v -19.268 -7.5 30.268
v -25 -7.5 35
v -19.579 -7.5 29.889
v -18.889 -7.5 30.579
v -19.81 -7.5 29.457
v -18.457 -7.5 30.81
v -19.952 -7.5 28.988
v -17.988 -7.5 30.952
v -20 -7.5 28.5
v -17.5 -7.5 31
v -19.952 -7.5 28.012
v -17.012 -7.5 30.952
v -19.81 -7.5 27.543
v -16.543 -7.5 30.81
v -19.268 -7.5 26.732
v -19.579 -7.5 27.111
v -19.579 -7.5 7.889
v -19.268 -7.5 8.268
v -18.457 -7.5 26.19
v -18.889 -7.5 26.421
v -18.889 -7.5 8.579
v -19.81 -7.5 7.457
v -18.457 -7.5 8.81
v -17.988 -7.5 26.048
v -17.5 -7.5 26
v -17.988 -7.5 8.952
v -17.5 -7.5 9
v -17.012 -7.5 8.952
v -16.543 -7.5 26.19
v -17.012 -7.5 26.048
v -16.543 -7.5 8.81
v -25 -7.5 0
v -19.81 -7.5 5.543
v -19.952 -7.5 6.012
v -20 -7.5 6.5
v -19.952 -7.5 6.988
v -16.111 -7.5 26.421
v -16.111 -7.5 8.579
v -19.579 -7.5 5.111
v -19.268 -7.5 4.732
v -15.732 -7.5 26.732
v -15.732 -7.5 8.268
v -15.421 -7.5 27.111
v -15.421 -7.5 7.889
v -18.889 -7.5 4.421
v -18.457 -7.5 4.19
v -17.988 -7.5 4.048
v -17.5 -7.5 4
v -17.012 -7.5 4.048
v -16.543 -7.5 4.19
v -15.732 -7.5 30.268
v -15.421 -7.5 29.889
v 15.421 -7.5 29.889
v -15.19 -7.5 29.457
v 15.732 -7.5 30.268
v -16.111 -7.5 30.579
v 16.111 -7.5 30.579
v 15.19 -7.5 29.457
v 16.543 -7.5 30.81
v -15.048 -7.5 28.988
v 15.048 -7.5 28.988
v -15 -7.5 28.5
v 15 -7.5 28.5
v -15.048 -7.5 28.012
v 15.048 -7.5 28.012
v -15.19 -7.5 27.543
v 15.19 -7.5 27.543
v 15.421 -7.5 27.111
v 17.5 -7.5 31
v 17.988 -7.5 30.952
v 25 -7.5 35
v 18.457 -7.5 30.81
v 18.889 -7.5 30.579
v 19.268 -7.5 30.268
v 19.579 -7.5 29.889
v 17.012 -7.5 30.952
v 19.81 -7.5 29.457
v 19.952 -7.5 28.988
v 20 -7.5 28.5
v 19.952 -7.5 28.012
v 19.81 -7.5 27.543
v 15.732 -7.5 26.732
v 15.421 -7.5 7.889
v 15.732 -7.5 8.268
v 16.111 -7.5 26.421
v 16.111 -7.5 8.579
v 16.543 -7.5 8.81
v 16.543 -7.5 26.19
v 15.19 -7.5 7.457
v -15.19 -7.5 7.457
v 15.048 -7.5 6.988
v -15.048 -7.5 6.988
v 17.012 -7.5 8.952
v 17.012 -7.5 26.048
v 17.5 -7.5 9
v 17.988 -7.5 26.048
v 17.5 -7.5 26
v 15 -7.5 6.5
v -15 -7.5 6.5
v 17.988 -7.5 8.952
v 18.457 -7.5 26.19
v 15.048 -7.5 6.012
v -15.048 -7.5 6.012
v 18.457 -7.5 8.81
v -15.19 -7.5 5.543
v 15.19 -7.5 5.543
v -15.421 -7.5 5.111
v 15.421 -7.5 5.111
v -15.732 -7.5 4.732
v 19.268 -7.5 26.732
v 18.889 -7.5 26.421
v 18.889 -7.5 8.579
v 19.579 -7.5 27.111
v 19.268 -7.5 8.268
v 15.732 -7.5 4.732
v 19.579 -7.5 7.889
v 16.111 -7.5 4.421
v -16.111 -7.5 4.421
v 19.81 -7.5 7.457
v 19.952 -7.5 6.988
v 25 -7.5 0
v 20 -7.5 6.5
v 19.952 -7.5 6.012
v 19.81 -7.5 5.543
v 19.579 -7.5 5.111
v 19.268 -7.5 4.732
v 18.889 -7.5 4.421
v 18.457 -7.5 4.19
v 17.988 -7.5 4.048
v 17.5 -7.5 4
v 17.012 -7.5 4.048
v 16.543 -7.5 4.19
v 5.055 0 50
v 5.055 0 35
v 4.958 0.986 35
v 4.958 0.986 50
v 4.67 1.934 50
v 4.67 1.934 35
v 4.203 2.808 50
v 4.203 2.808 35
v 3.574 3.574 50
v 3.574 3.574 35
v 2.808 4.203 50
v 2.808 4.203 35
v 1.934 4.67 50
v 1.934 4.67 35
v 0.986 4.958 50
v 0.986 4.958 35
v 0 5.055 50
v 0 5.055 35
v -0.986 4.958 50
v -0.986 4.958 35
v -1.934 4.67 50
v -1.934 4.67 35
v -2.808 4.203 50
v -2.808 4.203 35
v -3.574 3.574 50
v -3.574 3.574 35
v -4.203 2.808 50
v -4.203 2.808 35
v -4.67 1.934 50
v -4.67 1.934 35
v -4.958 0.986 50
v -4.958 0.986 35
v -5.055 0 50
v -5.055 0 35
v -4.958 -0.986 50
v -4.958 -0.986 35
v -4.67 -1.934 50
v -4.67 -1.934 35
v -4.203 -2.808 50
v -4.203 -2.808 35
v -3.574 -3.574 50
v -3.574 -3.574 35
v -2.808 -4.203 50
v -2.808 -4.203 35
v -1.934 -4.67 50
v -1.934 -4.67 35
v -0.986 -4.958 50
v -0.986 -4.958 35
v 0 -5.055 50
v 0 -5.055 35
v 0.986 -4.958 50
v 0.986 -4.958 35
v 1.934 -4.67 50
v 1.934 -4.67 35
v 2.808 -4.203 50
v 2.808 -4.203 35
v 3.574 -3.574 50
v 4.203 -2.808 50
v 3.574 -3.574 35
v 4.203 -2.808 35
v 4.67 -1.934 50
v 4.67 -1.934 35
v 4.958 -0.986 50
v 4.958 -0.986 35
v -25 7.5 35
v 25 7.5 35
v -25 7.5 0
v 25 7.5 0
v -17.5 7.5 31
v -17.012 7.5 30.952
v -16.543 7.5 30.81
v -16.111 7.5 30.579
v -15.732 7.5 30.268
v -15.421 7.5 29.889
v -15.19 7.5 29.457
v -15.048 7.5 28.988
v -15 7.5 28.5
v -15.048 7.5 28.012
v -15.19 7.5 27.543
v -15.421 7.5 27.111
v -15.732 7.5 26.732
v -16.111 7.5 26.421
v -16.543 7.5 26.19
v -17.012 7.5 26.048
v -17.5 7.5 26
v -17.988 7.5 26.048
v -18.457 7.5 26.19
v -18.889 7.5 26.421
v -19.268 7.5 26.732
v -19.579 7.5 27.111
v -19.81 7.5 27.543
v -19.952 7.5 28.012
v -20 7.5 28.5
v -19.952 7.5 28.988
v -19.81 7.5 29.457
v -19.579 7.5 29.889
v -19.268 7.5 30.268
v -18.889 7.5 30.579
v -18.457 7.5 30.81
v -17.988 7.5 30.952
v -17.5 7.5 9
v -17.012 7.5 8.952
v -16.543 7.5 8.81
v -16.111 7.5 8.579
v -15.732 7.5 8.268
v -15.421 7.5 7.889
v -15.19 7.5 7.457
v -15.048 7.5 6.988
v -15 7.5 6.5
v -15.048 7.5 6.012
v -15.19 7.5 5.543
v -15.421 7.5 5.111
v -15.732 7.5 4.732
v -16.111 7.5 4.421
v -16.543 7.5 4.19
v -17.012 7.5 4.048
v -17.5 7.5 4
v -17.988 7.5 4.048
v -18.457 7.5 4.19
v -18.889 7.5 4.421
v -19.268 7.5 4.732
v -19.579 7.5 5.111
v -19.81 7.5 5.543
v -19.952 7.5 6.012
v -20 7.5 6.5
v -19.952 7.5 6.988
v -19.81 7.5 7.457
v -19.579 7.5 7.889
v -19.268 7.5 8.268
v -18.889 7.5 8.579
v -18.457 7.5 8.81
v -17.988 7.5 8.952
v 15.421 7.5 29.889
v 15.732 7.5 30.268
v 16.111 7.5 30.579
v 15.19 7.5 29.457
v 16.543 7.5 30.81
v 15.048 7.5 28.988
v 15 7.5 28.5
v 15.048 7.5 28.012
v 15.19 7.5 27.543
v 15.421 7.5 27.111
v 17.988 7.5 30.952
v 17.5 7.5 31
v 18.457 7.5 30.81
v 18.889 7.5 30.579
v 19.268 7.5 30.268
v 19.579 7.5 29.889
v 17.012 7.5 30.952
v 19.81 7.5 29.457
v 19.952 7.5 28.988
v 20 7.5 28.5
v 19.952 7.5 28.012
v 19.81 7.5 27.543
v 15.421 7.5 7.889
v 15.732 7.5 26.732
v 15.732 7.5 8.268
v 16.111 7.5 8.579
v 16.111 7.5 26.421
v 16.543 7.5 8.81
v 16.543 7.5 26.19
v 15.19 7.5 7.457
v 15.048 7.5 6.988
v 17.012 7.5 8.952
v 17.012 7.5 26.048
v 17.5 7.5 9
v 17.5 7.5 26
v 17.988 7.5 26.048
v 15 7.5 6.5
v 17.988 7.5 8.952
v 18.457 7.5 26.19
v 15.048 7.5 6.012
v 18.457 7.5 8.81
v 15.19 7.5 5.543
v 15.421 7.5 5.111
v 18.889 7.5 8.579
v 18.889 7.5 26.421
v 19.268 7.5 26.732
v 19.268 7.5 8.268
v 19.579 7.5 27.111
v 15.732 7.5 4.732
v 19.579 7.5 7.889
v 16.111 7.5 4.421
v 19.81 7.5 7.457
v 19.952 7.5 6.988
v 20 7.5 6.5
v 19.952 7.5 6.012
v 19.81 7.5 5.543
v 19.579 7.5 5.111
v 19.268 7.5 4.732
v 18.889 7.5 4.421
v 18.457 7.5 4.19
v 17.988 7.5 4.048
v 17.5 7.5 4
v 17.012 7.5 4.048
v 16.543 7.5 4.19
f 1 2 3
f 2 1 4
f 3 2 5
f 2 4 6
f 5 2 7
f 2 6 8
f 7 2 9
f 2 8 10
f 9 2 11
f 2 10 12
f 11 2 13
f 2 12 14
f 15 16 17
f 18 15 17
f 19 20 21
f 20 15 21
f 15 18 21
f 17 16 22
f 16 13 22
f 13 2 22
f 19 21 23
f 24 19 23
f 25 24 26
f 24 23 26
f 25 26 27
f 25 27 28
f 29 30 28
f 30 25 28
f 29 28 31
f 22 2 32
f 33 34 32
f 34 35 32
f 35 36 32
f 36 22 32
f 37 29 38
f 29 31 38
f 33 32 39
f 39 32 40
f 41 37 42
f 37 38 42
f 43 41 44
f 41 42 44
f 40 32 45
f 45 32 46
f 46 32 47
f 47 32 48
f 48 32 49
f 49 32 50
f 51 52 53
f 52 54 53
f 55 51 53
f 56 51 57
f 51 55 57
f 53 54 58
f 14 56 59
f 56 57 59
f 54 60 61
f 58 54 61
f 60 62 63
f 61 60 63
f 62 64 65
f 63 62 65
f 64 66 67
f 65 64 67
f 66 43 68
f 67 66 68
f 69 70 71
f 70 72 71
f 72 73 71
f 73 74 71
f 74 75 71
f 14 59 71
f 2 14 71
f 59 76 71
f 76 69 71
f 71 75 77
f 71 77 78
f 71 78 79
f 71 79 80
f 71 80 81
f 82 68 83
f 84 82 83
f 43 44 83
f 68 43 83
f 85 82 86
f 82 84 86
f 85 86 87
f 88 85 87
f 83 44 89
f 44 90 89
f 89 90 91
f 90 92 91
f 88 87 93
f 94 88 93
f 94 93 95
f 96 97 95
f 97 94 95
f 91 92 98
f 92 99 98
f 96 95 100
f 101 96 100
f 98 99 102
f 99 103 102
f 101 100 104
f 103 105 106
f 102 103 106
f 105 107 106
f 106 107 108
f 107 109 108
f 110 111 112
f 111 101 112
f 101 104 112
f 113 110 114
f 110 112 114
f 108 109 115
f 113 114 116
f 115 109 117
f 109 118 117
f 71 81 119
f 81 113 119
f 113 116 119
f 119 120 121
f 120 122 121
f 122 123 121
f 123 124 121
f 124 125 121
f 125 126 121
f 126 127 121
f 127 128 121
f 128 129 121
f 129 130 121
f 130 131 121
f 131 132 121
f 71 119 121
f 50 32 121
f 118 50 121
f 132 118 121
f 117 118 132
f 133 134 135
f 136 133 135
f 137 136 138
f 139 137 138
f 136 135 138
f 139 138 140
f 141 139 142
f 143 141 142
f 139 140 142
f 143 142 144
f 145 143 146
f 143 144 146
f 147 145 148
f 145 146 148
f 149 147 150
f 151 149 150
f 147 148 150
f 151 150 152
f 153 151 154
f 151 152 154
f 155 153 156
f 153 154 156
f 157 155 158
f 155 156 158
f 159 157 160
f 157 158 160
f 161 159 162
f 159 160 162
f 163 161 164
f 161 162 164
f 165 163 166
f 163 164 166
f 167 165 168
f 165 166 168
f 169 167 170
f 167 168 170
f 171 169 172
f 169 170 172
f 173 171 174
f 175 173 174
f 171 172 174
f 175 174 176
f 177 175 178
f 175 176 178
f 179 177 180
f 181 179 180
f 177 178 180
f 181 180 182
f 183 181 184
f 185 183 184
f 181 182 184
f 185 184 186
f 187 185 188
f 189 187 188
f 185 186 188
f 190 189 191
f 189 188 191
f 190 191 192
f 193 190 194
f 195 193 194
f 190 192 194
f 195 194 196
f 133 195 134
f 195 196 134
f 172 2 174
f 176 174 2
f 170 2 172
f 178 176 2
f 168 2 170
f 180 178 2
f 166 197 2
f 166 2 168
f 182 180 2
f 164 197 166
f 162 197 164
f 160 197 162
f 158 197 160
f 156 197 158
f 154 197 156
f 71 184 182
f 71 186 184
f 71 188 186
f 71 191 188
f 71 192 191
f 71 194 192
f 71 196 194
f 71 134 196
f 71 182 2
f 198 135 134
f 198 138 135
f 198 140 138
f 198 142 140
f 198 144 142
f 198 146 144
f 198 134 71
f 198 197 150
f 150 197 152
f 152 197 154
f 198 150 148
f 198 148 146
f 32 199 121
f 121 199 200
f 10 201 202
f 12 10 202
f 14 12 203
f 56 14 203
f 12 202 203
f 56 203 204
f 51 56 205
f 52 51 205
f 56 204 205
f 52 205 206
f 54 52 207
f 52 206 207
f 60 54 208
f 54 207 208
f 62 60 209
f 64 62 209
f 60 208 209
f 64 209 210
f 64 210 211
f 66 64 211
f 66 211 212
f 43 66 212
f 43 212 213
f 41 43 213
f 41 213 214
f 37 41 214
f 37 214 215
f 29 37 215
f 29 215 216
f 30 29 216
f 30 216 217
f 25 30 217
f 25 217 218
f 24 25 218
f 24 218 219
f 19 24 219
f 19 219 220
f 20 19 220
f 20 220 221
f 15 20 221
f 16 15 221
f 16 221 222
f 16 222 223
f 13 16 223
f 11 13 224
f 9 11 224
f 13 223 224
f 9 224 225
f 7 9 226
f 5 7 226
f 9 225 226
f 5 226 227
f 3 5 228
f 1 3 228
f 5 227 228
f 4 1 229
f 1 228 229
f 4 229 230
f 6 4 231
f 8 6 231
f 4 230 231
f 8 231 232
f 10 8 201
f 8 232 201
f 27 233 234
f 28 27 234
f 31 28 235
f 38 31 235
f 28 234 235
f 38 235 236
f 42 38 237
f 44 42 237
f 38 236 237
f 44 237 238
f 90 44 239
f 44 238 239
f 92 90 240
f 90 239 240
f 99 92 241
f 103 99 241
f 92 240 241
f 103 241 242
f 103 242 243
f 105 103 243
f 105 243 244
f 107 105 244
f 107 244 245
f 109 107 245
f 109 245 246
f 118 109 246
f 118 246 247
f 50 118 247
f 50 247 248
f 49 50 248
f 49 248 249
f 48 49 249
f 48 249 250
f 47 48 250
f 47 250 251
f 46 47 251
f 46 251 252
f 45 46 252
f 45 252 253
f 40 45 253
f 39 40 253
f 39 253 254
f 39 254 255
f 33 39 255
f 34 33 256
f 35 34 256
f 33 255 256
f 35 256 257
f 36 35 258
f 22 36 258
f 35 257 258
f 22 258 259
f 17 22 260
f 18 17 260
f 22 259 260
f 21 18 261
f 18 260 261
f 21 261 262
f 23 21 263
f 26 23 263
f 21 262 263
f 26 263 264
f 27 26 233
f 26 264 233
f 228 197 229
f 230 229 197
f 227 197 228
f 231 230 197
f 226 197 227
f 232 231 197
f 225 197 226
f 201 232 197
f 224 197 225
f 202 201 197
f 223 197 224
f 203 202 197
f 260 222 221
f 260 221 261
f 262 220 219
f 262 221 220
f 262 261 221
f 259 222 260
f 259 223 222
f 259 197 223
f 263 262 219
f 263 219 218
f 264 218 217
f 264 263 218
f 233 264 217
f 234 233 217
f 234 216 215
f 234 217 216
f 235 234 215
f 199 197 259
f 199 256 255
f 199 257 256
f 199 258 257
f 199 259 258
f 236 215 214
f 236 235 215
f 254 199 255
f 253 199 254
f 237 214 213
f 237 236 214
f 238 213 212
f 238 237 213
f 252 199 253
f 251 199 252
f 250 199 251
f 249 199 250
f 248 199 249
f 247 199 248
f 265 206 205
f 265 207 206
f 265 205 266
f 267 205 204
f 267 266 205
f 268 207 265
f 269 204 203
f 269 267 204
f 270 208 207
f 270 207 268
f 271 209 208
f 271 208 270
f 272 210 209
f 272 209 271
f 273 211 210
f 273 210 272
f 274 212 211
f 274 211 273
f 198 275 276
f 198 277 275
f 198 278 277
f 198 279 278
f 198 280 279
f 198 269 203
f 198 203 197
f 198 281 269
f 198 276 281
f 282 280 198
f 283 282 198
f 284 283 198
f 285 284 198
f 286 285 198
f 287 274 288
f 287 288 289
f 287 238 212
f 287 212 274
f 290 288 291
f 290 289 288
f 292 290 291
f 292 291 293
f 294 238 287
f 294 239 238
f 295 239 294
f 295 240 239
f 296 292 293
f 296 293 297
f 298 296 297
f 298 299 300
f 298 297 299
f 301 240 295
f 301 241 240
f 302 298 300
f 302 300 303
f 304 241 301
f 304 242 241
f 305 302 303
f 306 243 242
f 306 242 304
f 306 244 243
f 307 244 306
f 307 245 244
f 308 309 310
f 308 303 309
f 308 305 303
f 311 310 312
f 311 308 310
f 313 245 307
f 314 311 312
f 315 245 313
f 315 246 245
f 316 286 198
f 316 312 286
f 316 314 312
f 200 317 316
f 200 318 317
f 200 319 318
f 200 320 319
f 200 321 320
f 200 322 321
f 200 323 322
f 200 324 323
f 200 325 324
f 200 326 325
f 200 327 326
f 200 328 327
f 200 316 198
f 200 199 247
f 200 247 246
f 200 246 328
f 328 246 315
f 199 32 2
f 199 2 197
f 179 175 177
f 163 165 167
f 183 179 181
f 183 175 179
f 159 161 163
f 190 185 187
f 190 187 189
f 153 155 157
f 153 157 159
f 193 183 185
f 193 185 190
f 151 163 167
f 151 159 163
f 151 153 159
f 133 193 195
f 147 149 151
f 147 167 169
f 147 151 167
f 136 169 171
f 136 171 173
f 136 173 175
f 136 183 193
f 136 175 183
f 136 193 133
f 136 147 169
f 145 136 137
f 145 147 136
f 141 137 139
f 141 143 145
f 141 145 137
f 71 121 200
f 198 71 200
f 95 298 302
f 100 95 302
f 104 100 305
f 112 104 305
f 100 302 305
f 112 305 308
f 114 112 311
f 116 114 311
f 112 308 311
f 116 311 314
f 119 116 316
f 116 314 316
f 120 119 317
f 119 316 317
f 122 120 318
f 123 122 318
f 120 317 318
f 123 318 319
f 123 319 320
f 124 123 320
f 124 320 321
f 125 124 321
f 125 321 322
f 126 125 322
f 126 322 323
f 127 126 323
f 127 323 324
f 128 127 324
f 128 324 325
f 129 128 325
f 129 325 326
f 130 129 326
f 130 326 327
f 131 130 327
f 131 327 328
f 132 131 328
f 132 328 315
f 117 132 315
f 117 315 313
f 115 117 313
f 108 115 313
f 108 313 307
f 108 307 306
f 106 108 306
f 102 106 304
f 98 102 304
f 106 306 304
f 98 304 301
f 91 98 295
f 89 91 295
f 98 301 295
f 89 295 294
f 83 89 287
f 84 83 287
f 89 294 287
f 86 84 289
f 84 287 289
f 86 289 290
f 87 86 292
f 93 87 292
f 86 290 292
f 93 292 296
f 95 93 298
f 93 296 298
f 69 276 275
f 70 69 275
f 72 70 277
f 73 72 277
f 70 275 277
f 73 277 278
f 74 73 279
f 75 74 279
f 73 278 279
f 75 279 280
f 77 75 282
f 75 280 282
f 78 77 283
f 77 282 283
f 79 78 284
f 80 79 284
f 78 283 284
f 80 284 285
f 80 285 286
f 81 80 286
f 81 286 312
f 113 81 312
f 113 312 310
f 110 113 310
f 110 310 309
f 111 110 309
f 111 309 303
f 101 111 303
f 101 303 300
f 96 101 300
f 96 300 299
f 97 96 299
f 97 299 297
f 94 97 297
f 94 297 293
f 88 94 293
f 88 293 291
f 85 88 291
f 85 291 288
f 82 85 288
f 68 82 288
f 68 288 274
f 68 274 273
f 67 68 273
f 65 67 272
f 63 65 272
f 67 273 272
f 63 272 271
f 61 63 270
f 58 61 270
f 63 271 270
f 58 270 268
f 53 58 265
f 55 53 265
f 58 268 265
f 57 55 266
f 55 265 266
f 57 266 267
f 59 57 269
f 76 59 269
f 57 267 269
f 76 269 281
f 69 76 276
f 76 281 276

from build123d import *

# Parameters (mm, degrees)
SKETCH1_W           = 50
SKETCH1_H           = 15
BOSS_EXTRUDE1_DEPTH = 35
SKETCH2_R           = 2.5
CUT_EXTRUDE1_DEPTH  = 30
SKETCH3_R           = 5.055
BOSS_EXTRUDE2_DEPTH = 15


with BuildPart() as part:
    # Sketch1 → Boss-Extrude1 (new body)
    with BuildSketch(Plane.XY):
        Rectangle(SKETCH1_W, SKETCH1_H)
    extrude(amount=BOSS_EXTRUDE1_DEPTH)

    # Sketch2 → Cut-Extrude1 (cut)
    with BuildSketch(Plane(origin=(0, 7.5, 0), x_dir=(1, 0, 0), z_dir=(0, 1, 0))):
        with Locations(Location((17.5, -6.5, 0), (0, 0, 270))):
            Circle(SKETCH2_R)
        with Locations(Location((17.5, -28.5, 0), (0, 0, 270))):
            Circle(SKETCH2_R)
        with Locations(Location((-17.5, -28.5, 0), (0, 0, 270))):
            Circle(SKETCH2_R)
        with Locations(Location((-17.5, -6.5, 0), (0, 0, 270))):
            Circle(SKETCH2_R)
    extrude(amount=-CUT_EXTRUDE1_DEPTH, mode=Mode.SUBTRACT)

    # Sketch3 → Boss-Extrude2 (add)
    with BuildSketch(Plane.XY.offset(35)):
        Circle(SKETCH3_R)
    extrude(amount=BOSS_EXTRUDE2_DEPTH)


solid = part.part
